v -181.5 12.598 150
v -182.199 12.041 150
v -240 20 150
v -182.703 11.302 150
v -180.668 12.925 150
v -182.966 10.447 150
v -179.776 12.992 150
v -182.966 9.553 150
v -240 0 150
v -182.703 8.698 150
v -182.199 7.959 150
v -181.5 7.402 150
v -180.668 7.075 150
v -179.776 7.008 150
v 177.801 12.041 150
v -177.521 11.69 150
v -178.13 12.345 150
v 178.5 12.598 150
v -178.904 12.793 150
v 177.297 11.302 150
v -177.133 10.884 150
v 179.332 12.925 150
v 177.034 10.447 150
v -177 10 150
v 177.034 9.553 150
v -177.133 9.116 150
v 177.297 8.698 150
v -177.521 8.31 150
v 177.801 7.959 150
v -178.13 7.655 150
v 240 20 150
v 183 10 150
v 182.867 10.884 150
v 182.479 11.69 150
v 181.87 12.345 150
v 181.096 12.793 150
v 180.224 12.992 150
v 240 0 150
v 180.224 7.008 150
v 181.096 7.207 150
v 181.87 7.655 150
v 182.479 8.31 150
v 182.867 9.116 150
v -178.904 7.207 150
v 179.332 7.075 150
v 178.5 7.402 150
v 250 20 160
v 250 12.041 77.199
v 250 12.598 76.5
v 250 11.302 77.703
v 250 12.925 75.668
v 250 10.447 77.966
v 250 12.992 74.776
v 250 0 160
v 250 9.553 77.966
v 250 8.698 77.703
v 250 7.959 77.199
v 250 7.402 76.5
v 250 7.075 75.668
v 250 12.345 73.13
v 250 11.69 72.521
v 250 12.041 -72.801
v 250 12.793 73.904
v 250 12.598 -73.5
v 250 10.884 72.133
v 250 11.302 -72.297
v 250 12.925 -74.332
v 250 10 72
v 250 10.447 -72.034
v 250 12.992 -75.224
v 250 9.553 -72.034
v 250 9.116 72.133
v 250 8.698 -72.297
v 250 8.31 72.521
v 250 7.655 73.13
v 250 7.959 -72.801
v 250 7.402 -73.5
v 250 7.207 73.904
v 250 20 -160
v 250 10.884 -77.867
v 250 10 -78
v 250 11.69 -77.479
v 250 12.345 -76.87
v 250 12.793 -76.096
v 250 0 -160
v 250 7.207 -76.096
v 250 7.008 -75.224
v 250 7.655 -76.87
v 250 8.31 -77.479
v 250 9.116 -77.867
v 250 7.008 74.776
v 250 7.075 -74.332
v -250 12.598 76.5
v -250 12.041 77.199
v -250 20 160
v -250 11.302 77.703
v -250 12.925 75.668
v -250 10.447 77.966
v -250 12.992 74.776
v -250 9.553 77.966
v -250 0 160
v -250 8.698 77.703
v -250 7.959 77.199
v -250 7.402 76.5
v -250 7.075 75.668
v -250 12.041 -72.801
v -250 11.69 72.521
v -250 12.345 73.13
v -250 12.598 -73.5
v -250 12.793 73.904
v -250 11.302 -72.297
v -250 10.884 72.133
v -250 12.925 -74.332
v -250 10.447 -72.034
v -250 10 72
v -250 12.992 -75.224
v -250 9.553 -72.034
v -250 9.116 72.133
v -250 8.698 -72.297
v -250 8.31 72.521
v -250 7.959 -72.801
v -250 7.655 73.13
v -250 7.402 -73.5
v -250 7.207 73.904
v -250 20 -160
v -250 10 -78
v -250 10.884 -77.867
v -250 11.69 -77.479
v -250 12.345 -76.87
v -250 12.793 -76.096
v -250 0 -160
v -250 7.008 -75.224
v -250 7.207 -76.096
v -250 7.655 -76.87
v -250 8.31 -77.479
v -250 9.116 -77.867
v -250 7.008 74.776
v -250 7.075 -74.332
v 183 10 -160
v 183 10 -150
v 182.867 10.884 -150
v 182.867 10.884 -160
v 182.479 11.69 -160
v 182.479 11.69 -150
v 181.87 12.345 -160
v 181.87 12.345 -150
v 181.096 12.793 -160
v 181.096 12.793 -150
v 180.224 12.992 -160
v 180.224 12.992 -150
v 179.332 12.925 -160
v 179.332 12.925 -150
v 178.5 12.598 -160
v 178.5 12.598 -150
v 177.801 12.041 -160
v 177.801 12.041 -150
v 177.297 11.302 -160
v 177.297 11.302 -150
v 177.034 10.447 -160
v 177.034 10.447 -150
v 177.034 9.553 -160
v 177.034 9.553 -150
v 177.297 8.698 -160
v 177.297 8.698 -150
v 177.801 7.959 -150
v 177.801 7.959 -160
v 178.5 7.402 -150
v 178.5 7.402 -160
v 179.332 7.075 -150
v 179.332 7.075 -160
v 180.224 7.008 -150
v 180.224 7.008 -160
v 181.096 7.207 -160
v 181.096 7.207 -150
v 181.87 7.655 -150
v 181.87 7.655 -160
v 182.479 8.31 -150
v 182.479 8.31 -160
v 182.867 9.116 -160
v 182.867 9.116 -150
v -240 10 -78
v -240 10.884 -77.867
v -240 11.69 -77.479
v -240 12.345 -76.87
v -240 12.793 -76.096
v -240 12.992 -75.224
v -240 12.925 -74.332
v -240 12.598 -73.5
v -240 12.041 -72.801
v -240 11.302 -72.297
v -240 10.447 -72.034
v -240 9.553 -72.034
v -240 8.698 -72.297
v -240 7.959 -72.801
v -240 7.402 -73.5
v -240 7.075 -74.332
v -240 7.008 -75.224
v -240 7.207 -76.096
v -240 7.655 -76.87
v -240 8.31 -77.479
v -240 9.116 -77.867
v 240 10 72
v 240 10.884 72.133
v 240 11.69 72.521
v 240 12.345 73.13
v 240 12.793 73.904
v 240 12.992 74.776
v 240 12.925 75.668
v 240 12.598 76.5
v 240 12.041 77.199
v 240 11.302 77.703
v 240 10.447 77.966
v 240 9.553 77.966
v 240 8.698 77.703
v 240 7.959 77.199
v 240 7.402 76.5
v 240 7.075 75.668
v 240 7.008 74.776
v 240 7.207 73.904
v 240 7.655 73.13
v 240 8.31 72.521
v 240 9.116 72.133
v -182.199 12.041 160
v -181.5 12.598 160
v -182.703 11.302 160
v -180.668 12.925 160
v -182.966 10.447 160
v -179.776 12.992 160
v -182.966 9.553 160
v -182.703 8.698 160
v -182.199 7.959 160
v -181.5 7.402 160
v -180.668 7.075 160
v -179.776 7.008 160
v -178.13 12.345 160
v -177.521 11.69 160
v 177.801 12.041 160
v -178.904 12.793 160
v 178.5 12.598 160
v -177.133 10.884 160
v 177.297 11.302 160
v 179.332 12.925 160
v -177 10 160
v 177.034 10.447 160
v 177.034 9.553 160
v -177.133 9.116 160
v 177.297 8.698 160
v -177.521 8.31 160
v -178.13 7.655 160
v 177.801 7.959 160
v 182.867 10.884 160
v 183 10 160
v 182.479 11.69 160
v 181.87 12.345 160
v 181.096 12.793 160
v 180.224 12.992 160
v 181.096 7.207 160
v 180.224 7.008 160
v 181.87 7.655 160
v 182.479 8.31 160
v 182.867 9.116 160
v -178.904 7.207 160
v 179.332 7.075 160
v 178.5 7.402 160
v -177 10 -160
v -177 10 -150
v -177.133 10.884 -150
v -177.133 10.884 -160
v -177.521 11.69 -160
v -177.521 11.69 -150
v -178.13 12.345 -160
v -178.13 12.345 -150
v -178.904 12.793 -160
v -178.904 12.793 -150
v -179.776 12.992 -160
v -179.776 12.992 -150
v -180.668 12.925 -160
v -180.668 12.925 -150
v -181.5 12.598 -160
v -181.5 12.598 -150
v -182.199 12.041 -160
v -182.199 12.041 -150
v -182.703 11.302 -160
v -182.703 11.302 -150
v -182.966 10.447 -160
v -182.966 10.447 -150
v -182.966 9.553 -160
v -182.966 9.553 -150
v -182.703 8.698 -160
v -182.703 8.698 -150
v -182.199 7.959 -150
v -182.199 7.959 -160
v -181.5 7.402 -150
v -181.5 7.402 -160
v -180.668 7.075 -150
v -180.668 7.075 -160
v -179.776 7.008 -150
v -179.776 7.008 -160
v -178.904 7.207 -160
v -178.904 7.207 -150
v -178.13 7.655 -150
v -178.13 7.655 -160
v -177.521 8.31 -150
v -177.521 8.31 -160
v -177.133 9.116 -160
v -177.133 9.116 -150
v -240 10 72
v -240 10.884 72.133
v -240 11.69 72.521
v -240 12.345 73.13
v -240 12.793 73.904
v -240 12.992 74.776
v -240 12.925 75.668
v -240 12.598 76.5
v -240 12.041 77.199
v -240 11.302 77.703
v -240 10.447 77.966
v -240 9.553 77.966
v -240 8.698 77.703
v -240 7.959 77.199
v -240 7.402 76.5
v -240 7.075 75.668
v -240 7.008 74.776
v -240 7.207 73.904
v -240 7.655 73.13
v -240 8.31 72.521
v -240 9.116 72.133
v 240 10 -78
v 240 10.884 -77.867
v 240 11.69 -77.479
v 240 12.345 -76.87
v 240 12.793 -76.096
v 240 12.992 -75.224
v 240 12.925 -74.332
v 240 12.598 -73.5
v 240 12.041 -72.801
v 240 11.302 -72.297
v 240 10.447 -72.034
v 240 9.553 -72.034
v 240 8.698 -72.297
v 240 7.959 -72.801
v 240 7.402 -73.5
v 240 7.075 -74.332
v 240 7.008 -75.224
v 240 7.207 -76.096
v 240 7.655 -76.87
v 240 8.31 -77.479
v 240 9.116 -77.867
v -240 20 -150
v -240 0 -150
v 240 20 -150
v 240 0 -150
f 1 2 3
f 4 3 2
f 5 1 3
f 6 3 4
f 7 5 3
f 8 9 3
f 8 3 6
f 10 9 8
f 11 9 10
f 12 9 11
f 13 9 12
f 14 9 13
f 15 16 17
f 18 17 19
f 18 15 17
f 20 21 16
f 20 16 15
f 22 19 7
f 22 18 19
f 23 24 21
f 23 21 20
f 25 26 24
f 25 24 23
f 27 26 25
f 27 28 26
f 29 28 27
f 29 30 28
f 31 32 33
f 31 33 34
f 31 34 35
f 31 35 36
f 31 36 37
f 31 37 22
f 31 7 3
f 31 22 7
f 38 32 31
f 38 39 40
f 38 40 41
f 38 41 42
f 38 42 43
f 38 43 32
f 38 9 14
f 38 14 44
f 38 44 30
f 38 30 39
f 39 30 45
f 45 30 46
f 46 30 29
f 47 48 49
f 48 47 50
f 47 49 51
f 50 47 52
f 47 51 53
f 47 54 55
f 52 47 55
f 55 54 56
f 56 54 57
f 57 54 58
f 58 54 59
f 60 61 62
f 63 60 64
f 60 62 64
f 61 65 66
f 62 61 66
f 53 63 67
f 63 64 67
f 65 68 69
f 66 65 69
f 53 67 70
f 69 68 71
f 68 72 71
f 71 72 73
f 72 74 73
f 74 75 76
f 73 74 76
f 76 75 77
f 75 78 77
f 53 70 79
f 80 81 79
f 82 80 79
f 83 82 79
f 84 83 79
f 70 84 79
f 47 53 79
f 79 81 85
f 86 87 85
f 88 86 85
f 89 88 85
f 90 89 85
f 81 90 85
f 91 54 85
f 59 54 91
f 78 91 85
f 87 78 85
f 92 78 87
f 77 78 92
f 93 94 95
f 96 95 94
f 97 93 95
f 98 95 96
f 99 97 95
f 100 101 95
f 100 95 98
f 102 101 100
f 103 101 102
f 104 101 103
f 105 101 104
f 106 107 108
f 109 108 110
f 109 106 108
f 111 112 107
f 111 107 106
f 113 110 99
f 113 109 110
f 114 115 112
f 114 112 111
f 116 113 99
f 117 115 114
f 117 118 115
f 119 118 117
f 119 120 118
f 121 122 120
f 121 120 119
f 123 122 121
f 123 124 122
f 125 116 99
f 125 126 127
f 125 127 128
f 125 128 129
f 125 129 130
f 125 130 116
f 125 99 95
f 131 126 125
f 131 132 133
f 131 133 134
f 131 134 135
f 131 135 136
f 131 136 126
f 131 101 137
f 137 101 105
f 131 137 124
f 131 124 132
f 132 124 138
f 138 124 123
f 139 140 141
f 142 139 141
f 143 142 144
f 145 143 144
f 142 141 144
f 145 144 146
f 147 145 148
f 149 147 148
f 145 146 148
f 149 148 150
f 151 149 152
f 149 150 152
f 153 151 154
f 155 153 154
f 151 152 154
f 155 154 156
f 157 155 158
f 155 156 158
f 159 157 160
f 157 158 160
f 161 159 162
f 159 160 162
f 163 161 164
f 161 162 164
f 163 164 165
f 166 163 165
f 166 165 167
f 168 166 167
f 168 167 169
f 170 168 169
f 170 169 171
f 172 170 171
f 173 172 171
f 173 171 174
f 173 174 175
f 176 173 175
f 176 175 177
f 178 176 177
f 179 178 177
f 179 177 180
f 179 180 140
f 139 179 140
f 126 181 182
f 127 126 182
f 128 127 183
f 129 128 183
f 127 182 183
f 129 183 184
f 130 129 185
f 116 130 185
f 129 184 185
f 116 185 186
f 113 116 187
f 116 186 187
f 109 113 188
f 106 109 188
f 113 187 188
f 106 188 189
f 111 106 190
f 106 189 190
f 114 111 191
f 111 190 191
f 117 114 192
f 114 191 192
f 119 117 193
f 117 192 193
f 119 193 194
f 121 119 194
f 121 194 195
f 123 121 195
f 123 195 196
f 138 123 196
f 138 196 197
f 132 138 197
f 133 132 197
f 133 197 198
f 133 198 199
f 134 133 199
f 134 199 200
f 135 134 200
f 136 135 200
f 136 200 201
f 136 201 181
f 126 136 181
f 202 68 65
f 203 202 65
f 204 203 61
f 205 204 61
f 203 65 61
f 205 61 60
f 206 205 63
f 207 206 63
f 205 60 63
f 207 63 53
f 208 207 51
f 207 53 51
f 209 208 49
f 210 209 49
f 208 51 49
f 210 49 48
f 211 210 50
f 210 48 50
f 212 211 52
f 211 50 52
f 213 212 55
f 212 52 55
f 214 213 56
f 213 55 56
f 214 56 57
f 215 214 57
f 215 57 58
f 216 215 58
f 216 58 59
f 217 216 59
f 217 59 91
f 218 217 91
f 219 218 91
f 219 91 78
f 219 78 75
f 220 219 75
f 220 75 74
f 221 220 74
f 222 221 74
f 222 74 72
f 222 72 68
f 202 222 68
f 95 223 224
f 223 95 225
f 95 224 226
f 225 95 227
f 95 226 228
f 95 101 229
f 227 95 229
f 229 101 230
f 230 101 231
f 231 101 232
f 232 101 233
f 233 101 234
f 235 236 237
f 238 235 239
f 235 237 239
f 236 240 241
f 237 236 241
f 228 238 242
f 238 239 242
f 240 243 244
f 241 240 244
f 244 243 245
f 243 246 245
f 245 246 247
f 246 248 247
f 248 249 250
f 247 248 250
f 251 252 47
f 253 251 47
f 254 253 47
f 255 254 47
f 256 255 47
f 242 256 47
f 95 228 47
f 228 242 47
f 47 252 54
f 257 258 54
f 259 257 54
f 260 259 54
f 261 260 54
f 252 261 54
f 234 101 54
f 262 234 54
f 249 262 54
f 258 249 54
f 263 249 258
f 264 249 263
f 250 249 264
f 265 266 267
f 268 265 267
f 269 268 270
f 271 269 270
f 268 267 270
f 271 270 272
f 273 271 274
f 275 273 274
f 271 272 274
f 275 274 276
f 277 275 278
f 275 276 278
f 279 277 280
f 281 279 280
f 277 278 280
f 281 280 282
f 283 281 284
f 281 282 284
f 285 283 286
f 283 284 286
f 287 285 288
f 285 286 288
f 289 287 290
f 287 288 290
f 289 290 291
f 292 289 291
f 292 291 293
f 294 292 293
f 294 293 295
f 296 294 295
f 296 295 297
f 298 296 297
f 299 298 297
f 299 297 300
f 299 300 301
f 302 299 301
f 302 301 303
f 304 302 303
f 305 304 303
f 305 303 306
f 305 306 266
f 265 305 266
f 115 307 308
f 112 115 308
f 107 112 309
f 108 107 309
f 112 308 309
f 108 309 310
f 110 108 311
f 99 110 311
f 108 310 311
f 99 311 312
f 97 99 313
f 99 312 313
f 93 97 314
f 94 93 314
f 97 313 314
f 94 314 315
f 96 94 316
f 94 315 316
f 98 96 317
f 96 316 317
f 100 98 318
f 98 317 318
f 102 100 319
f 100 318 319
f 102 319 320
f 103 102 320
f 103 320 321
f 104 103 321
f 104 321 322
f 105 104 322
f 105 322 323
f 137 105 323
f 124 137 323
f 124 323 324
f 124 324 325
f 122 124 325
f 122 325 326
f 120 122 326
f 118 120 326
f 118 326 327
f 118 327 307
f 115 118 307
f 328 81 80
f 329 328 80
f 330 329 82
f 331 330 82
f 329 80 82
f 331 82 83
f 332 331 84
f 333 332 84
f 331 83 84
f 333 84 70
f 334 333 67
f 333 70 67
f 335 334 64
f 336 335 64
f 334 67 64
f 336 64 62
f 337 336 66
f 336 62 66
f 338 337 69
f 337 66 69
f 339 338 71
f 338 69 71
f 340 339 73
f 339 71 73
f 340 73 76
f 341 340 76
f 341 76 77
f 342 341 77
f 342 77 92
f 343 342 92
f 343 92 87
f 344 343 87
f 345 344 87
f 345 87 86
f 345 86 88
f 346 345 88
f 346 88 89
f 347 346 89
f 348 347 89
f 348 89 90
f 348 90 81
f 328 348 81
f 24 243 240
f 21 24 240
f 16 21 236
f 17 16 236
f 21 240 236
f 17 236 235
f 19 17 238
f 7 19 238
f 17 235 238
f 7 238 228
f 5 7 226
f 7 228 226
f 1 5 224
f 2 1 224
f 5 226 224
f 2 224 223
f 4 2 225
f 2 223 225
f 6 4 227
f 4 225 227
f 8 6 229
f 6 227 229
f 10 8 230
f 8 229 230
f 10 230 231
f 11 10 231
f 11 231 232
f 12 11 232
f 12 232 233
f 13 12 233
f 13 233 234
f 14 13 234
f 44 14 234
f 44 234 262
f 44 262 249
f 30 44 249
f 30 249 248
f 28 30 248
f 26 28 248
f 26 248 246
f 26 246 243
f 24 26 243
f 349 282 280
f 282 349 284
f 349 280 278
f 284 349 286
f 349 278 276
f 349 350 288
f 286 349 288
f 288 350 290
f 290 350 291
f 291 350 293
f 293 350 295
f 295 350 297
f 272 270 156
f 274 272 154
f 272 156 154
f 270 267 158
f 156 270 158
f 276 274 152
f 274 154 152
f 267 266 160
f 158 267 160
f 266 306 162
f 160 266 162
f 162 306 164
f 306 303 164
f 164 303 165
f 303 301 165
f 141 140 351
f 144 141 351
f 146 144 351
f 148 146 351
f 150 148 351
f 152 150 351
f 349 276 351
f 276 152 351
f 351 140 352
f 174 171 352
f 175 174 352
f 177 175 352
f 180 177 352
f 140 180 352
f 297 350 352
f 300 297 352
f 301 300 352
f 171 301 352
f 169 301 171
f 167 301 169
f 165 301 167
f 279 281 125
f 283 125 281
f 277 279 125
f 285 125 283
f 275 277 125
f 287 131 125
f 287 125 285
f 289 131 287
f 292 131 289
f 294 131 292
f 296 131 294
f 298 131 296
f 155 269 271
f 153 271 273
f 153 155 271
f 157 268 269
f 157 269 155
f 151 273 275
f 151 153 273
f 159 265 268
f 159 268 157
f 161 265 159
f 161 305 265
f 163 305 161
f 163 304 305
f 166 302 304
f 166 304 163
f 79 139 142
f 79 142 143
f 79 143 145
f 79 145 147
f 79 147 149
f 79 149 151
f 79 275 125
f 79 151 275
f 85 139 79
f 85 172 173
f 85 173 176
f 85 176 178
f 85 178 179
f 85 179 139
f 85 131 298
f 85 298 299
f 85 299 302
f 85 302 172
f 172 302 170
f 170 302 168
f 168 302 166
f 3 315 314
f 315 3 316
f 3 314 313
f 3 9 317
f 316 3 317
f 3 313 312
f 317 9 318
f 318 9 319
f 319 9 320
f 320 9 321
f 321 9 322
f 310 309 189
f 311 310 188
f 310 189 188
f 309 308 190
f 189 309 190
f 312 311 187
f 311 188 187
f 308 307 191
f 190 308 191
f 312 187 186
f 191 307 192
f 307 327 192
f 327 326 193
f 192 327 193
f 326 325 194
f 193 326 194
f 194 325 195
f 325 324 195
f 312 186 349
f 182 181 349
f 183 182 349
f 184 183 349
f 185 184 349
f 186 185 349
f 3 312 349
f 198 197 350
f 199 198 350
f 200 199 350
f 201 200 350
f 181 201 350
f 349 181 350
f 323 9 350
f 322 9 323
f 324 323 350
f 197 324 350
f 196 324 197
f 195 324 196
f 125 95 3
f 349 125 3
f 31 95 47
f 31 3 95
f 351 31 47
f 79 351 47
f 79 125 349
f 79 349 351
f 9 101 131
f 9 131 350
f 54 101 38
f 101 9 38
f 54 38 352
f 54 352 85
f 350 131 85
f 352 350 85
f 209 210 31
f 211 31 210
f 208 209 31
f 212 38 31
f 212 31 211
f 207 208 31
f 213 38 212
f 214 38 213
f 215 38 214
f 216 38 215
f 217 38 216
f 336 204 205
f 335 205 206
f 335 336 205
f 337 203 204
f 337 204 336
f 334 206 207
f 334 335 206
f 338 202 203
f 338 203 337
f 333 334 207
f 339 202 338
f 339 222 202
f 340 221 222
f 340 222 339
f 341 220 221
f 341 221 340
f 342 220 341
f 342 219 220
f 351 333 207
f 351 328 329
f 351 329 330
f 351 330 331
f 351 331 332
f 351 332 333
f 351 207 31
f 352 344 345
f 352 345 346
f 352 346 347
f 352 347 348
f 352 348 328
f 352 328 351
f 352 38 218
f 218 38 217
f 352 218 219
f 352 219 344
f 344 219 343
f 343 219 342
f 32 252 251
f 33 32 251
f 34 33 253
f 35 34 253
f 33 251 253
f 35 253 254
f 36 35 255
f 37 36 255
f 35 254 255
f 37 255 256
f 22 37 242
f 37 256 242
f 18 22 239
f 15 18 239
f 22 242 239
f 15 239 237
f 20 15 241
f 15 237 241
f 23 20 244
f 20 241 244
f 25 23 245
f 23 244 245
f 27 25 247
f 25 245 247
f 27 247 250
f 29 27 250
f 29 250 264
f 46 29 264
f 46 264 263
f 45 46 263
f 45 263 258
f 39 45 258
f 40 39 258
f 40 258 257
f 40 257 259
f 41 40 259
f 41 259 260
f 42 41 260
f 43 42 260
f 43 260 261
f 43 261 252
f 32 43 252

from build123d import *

# Parameters (mm, degrees)
SKETCH1_W           = 500
SKETCH1_H           = 320
SKETCH1_W_2         = 480
SKETCH1_H_2         = 300
BOSS_EXTRUDE1_DEPTH = 20
SKETCH2_R           = 3
CUT_EXTRUDE1_DEPTH  = 500
SKETCH3_R           = 3
CUT_EXTRUDE2_DEPTH  = 320


with BuildPart() as part:
    # Sketch1 → Boss-Extrude1 (new body)
    with BuildSketch(Plane(origin=(0, 0, 0), x_dir=(1, 0, 0), z_dir=(0, 1, 0))):
        Rectangle(SKETCH1_W, SKETCH1_H)
        Rectangle(SKETCH1_W_2, SKETCH1_H_2, mode=Mode.SUBTRACT)
    extrude(amount=BOSS_EXTRUDE1_DEPTH)

    # Sketch2 → Cut-Extrude1 (cut)
    with BuildSketch(Plane(origin=(250, 0, 0), x_dir=(0, 0, -1), z_dir=(1, 0, 0))):
        with Locations((75, 10)):
            Circle(SKETCH2_R)
        with Locations((-75, 10)):
            Circle(SKETCH2_R)
    extrude(amount=-CUT_EXTRUDE1_DEPTH, mode=Mode.SUBTRACT)

    # Sketch3 → Cut-Extrude2 (cut)
    with BuildSketch(Plane.XY.offset(160)):
        with Locations((-180, 10)):
            Circle(SKETCH3_R)
        with Locations((180, 10)):
            Circle(SKETCH3_R)
    extrude(amount=-CUT_EXTRUDE2_DEPTH, mode=Mode.SUBTRACT)


solid = part.part
